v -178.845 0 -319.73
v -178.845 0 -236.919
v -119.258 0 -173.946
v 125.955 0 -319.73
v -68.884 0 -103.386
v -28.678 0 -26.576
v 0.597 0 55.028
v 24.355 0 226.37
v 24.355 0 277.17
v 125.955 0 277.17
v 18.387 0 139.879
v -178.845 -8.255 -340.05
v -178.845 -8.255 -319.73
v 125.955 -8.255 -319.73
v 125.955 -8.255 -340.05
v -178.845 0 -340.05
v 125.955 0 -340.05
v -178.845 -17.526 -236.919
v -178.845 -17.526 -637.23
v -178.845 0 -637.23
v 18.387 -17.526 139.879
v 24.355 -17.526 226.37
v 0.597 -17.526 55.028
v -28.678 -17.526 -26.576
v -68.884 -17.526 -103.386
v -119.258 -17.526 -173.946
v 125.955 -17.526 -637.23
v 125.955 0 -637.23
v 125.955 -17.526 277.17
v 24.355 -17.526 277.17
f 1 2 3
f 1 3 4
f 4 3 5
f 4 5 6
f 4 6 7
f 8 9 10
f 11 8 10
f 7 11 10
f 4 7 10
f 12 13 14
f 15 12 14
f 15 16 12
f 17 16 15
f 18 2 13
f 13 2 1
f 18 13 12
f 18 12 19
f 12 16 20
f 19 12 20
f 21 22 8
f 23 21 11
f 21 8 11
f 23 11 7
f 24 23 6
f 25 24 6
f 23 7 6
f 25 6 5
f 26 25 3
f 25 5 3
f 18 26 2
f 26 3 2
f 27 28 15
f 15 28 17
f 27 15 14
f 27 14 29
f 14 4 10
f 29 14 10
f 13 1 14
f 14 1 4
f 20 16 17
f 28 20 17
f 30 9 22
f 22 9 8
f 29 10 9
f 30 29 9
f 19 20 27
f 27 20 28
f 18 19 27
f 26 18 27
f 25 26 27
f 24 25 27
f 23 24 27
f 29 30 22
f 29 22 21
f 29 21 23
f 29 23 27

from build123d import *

# Parameters (mm, degrees)
F0_W     = 304.8
F0_H     = 297.18
F0_H_2   = 20.32
F1_DEPTH = 17.526
F2_DEPTH = 8.255


with BuildPart() as f1:
    # F0 (on Front) → F1 (new body)
    with BuildSketch(Plane.XZ):
        with Locations((-26.445295, -488.64002)):
            Rectangle(F0_W, F0_H)
        with Locations((-26.445295, -329.89002)):
            Rectangle(F0_W, F0_H_2)
        with BuildLine():
            Line((-178.845295, -299.41002), (-178.845295, -319.73002))
            Line((-178.845295, -319.73002), (125.954705, -319.73002))
            Line((125.954705, -319.73002), (125.954705, -299.41002))
            Line((125.954705, -299.41002), (125.954705, -278.324652))
            Line((125.954705, -278.324652), (125.954705, -258.004652))
            Line((125.954705, -258.004652), (125.954705, 277.16998))
            Line((125.954705, 277.16998), (24.354705, 277.16998))
            Line((24.354705, 277.16998), (24.354705, 226.36998))
            ThreePointArc((24.354705, 226.36998), (-28.678357, -26.576251), (-178.845295, -236.919284))
            Line((-178.845295, -236.919284), (-178.845295, -258.004652))
            Line((-178.845295, -258.004652), (-178.845295, -299.41002))
        make_face()
    extrude(amount=F1_DEPTH)

    # F0 (on Front) → F2 (cut)
    with BuildSketch(Plane.XZ):
        with Locations((-26.445295, -329.89002)):
            Rectangle(F0_W, F0_H_2)
    extrude(amount=F2_DEPTH, mode=Mode.SUBTRACT)


solid = f1.part
